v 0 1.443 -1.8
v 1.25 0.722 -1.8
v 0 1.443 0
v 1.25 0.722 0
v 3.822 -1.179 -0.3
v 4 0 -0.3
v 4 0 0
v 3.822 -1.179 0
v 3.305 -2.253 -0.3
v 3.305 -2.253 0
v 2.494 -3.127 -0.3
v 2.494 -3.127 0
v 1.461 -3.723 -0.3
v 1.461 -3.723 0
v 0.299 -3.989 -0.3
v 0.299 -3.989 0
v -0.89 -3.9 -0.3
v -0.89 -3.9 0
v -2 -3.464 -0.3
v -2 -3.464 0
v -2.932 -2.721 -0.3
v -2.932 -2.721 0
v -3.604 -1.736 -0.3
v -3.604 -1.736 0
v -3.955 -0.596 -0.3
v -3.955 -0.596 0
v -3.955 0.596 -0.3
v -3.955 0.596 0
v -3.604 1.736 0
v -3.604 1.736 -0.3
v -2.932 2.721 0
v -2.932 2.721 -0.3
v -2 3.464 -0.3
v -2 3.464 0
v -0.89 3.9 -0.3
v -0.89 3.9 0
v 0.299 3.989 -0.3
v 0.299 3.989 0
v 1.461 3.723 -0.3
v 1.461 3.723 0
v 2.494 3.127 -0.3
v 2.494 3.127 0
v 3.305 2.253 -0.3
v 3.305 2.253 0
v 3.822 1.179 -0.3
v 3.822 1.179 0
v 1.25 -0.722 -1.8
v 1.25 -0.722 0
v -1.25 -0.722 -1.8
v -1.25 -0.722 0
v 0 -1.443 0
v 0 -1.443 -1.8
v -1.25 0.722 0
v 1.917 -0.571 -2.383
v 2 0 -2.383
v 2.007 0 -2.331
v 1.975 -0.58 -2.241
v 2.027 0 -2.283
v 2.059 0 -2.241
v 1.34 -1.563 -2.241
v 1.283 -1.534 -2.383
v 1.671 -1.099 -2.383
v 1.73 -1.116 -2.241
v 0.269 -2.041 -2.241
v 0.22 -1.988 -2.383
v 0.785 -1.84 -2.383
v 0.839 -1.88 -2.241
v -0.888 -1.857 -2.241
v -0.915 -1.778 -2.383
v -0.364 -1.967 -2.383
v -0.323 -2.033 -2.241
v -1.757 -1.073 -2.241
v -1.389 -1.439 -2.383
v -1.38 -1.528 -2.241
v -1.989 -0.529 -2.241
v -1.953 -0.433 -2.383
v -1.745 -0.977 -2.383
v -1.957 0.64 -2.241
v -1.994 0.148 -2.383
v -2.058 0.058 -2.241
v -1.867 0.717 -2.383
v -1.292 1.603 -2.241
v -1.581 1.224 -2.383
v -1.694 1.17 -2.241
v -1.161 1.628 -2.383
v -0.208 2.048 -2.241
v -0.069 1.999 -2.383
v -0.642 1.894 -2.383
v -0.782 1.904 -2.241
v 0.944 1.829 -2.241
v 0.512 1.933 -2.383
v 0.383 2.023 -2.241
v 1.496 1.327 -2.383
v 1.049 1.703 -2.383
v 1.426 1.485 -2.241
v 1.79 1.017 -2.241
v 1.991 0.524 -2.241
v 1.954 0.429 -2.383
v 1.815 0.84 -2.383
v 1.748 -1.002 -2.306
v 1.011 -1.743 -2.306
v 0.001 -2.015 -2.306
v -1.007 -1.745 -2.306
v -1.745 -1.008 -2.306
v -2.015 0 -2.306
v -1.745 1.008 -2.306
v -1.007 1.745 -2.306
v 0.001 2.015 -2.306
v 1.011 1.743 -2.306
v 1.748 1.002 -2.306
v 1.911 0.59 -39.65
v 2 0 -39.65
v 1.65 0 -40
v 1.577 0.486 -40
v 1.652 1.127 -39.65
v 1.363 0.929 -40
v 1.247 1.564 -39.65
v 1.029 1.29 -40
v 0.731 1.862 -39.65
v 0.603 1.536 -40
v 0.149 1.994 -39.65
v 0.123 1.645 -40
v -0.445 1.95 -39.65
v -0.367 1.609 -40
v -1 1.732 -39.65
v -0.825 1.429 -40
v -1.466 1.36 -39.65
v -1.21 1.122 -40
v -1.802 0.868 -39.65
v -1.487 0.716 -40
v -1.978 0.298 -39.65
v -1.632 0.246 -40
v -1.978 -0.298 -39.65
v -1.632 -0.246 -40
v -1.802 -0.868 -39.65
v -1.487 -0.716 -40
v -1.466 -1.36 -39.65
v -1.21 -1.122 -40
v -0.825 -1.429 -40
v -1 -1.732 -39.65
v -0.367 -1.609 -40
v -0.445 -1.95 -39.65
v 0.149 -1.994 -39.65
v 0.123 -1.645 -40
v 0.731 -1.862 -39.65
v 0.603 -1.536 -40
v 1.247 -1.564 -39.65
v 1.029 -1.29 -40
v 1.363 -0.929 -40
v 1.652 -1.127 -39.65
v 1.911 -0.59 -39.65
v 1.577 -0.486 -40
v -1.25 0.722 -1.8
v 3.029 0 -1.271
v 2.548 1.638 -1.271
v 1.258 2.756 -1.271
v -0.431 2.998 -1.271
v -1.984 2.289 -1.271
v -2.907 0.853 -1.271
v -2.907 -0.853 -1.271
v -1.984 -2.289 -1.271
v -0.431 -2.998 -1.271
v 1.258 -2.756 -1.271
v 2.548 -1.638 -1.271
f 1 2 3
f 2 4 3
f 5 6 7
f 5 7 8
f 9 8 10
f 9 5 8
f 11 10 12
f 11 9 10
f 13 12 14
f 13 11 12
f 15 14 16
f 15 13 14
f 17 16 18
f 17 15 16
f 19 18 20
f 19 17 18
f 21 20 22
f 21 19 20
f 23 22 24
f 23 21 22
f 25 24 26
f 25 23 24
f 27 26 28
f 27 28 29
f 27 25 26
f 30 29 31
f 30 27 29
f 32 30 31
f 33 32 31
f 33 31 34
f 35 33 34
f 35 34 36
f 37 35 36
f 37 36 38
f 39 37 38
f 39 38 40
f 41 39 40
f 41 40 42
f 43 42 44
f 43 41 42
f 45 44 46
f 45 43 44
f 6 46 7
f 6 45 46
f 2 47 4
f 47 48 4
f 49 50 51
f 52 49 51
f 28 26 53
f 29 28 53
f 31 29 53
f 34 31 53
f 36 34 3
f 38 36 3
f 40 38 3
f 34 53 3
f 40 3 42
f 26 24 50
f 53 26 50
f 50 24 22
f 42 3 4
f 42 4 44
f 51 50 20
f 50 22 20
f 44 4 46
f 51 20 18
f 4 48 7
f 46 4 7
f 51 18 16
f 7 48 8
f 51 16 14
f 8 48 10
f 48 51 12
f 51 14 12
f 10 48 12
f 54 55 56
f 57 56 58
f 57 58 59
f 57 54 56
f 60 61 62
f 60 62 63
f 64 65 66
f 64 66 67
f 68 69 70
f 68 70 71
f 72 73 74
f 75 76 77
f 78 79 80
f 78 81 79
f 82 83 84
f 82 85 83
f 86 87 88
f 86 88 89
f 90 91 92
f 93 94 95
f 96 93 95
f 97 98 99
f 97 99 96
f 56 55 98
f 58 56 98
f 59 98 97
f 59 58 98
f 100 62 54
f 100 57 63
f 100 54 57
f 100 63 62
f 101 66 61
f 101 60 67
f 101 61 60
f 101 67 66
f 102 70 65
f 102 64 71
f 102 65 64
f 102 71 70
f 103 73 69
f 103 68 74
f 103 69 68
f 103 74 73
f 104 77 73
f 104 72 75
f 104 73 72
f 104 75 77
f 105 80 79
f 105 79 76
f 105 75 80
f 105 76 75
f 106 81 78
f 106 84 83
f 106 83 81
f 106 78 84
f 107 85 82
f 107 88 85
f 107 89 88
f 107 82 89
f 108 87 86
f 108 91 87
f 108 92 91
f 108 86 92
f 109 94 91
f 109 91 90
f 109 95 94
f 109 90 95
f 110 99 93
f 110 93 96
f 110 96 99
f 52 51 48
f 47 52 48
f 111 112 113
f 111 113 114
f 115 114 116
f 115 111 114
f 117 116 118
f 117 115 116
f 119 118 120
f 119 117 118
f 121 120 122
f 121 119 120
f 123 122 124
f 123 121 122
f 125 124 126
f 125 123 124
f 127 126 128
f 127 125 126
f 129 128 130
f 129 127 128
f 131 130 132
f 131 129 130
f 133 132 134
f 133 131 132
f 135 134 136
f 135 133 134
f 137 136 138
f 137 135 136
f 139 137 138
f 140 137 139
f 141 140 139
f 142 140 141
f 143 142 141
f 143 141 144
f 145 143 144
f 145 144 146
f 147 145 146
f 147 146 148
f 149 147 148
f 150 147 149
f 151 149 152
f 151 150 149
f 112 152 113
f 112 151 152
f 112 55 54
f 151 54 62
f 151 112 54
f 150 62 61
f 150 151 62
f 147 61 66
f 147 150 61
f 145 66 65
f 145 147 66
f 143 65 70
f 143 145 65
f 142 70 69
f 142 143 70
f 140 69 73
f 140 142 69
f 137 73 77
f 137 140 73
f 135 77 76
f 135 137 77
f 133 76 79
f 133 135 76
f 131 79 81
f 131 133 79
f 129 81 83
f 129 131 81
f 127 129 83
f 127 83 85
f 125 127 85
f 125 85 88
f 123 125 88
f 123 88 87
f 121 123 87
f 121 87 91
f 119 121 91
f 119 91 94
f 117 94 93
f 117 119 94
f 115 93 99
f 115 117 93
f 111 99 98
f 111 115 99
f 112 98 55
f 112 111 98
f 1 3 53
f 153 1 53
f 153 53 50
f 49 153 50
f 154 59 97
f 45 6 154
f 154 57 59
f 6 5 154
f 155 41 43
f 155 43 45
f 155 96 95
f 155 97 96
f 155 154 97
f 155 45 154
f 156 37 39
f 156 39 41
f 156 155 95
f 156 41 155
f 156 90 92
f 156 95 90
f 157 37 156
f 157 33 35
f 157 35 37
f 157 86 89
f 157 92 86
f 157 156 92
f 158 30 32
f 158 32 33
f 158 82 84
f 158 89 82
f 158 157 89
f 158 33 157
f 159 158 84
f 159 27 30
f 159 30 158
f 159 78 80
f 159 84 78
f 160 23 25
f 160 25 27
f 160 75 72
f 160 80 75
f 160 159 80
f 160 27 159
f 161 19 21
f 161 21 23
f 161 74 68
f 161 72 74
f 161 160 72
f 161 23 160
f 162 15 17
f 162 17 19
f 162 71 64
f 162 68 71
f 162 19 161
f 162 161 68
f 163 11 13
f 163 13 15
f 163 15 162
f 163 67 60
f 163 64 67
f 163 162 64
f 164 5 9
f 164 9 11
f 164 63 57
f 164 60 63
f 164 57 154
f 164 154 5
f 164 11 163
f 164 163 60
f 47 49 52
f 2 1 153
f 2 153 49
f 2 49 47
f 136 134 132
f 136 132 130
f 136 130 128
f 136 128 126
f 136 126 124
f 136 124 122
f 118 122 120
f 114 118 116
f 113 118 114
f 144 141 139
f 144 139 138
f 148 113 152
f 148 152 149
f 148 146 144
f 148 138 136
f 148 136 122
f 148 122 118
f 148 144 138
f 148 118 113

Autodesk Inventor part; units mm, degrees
ref_plane "YZ Plane" through (0, 0, 0) normal (1, 0, 0) x (0, 1, 0)
sketch "Sketch1" plane through (0, 0, 0) normal (0, 1, 0) x (-1, 0, 0)
  point P0 (0, 0)
sketch "Sketch2" plane through (0, 0, 0) normal (0, 1, 0) x (-1, 0, 0)
  line L0 (-2, -40) -> (0, -40)
  line L1 (-2, -2.3) -> (-2, -40)
  line L2 (-4, -0.3) -> (-2, -2.3)
  line L3 (-4, 0) -> (-4, -0.3)
  line L4 (0, 0) -> (-4, 0)
  line L5 (0, -40) -> (0, 0)
  line L6 (0, -40) -> (0, 0)
  line L7 (0, -48) -> (0, 8) projected
  line L8 (0.8, 0) -> (-4.8, 0) projected
  dimension "d3" = 4
  dimension "d5" = 2
  dimension "d7" = 40
  dimension "ParC" = 0.3
  dimension "d22" = 0
  dimension "d23" = 0
  dimension "d43" = 45
revolve "Revolution1" add sketch "Sketch2" angle 360 about axis through (0, 0, -40) along (0, 0, -1)
sketch "Sketch3" plane through (0, 0, 0) normal (0, 0, 1) x (1, 0, 0)
  line L0 (-1.25, 0.7217) -> (-1.25, -0.7217)
  line L1 (0, 1.4434) -> (-1.25, 0.7217)
  line L2 (1.25, 0.7217) -> (0, 1.4434)
  line L3 (1.25, -0.7217) -> (1.25, 0.7217)
  line L4 (0, -1.4434) -> (1.25, -0.7217)
  line L5 (-1.25, -0.7217) -> (0, -1.4434)
  circle A0 centre (0, 0) radius 1.25 construction
  circle A1 centre (0, 0) radius 2 construction
  dimension "d11" = 2.5
  dimension "d13" = 120
  dimension "d15" = 120
extrude "Extrusion1" cut sketch "Sketch3" against normal blind 1.8
fillet "Fillet1" radius 0.2 1 edges at (-2, 0, -2.3)
chamfer "Chamfer1" distance 0.35 angle 45 1 edges at (-2, 0, -40) measured on face at (-0.9288, -1.7713, -27.4609)
thread "Thread1" size "M4x0.7" class "6g" standard "ISO Metric profile" length 14
ref_plane "MSC_PF1" through (0, 0, 0) normal (1, 0, 0) x (0, 1, 0)
ref_plane "MSC_PT1" through (0, 0, 0) normal (0, 0, -1) x (-1, 0, 0)
equation "\"d3\" = 0.5 * dk"
equation "\"d5\" = 0.5 * NND"
equation "\"d7\" = NLG"
equation "\"d43\" = 0.5 * ang"
equation "\"d18\" = r"
equation "\"d19\" = 0.5 * PTC"
equation "\"d39\" = 0.5 * PTC"
equation "\"d11\" = ParS"
equation "\"d16\" = ParT"
equation "\"NND\" = 4"
equation "\"PTC\" = 0.7"
equation "\"dk\" = 8"
equation "\"ParK\" = 2.3"
equation "\"ParS\" = 2.5"
equation "\"ParT\" = 1.8"
equation "\"r\" = 0.2"
equation "\"NLG\" = 40"
equation "\"ang\" = 90deg"
equation "\"THREADDIA\" = NND"
properties part number "DIN 7991 - M4x40" material "Steel, Mild"
